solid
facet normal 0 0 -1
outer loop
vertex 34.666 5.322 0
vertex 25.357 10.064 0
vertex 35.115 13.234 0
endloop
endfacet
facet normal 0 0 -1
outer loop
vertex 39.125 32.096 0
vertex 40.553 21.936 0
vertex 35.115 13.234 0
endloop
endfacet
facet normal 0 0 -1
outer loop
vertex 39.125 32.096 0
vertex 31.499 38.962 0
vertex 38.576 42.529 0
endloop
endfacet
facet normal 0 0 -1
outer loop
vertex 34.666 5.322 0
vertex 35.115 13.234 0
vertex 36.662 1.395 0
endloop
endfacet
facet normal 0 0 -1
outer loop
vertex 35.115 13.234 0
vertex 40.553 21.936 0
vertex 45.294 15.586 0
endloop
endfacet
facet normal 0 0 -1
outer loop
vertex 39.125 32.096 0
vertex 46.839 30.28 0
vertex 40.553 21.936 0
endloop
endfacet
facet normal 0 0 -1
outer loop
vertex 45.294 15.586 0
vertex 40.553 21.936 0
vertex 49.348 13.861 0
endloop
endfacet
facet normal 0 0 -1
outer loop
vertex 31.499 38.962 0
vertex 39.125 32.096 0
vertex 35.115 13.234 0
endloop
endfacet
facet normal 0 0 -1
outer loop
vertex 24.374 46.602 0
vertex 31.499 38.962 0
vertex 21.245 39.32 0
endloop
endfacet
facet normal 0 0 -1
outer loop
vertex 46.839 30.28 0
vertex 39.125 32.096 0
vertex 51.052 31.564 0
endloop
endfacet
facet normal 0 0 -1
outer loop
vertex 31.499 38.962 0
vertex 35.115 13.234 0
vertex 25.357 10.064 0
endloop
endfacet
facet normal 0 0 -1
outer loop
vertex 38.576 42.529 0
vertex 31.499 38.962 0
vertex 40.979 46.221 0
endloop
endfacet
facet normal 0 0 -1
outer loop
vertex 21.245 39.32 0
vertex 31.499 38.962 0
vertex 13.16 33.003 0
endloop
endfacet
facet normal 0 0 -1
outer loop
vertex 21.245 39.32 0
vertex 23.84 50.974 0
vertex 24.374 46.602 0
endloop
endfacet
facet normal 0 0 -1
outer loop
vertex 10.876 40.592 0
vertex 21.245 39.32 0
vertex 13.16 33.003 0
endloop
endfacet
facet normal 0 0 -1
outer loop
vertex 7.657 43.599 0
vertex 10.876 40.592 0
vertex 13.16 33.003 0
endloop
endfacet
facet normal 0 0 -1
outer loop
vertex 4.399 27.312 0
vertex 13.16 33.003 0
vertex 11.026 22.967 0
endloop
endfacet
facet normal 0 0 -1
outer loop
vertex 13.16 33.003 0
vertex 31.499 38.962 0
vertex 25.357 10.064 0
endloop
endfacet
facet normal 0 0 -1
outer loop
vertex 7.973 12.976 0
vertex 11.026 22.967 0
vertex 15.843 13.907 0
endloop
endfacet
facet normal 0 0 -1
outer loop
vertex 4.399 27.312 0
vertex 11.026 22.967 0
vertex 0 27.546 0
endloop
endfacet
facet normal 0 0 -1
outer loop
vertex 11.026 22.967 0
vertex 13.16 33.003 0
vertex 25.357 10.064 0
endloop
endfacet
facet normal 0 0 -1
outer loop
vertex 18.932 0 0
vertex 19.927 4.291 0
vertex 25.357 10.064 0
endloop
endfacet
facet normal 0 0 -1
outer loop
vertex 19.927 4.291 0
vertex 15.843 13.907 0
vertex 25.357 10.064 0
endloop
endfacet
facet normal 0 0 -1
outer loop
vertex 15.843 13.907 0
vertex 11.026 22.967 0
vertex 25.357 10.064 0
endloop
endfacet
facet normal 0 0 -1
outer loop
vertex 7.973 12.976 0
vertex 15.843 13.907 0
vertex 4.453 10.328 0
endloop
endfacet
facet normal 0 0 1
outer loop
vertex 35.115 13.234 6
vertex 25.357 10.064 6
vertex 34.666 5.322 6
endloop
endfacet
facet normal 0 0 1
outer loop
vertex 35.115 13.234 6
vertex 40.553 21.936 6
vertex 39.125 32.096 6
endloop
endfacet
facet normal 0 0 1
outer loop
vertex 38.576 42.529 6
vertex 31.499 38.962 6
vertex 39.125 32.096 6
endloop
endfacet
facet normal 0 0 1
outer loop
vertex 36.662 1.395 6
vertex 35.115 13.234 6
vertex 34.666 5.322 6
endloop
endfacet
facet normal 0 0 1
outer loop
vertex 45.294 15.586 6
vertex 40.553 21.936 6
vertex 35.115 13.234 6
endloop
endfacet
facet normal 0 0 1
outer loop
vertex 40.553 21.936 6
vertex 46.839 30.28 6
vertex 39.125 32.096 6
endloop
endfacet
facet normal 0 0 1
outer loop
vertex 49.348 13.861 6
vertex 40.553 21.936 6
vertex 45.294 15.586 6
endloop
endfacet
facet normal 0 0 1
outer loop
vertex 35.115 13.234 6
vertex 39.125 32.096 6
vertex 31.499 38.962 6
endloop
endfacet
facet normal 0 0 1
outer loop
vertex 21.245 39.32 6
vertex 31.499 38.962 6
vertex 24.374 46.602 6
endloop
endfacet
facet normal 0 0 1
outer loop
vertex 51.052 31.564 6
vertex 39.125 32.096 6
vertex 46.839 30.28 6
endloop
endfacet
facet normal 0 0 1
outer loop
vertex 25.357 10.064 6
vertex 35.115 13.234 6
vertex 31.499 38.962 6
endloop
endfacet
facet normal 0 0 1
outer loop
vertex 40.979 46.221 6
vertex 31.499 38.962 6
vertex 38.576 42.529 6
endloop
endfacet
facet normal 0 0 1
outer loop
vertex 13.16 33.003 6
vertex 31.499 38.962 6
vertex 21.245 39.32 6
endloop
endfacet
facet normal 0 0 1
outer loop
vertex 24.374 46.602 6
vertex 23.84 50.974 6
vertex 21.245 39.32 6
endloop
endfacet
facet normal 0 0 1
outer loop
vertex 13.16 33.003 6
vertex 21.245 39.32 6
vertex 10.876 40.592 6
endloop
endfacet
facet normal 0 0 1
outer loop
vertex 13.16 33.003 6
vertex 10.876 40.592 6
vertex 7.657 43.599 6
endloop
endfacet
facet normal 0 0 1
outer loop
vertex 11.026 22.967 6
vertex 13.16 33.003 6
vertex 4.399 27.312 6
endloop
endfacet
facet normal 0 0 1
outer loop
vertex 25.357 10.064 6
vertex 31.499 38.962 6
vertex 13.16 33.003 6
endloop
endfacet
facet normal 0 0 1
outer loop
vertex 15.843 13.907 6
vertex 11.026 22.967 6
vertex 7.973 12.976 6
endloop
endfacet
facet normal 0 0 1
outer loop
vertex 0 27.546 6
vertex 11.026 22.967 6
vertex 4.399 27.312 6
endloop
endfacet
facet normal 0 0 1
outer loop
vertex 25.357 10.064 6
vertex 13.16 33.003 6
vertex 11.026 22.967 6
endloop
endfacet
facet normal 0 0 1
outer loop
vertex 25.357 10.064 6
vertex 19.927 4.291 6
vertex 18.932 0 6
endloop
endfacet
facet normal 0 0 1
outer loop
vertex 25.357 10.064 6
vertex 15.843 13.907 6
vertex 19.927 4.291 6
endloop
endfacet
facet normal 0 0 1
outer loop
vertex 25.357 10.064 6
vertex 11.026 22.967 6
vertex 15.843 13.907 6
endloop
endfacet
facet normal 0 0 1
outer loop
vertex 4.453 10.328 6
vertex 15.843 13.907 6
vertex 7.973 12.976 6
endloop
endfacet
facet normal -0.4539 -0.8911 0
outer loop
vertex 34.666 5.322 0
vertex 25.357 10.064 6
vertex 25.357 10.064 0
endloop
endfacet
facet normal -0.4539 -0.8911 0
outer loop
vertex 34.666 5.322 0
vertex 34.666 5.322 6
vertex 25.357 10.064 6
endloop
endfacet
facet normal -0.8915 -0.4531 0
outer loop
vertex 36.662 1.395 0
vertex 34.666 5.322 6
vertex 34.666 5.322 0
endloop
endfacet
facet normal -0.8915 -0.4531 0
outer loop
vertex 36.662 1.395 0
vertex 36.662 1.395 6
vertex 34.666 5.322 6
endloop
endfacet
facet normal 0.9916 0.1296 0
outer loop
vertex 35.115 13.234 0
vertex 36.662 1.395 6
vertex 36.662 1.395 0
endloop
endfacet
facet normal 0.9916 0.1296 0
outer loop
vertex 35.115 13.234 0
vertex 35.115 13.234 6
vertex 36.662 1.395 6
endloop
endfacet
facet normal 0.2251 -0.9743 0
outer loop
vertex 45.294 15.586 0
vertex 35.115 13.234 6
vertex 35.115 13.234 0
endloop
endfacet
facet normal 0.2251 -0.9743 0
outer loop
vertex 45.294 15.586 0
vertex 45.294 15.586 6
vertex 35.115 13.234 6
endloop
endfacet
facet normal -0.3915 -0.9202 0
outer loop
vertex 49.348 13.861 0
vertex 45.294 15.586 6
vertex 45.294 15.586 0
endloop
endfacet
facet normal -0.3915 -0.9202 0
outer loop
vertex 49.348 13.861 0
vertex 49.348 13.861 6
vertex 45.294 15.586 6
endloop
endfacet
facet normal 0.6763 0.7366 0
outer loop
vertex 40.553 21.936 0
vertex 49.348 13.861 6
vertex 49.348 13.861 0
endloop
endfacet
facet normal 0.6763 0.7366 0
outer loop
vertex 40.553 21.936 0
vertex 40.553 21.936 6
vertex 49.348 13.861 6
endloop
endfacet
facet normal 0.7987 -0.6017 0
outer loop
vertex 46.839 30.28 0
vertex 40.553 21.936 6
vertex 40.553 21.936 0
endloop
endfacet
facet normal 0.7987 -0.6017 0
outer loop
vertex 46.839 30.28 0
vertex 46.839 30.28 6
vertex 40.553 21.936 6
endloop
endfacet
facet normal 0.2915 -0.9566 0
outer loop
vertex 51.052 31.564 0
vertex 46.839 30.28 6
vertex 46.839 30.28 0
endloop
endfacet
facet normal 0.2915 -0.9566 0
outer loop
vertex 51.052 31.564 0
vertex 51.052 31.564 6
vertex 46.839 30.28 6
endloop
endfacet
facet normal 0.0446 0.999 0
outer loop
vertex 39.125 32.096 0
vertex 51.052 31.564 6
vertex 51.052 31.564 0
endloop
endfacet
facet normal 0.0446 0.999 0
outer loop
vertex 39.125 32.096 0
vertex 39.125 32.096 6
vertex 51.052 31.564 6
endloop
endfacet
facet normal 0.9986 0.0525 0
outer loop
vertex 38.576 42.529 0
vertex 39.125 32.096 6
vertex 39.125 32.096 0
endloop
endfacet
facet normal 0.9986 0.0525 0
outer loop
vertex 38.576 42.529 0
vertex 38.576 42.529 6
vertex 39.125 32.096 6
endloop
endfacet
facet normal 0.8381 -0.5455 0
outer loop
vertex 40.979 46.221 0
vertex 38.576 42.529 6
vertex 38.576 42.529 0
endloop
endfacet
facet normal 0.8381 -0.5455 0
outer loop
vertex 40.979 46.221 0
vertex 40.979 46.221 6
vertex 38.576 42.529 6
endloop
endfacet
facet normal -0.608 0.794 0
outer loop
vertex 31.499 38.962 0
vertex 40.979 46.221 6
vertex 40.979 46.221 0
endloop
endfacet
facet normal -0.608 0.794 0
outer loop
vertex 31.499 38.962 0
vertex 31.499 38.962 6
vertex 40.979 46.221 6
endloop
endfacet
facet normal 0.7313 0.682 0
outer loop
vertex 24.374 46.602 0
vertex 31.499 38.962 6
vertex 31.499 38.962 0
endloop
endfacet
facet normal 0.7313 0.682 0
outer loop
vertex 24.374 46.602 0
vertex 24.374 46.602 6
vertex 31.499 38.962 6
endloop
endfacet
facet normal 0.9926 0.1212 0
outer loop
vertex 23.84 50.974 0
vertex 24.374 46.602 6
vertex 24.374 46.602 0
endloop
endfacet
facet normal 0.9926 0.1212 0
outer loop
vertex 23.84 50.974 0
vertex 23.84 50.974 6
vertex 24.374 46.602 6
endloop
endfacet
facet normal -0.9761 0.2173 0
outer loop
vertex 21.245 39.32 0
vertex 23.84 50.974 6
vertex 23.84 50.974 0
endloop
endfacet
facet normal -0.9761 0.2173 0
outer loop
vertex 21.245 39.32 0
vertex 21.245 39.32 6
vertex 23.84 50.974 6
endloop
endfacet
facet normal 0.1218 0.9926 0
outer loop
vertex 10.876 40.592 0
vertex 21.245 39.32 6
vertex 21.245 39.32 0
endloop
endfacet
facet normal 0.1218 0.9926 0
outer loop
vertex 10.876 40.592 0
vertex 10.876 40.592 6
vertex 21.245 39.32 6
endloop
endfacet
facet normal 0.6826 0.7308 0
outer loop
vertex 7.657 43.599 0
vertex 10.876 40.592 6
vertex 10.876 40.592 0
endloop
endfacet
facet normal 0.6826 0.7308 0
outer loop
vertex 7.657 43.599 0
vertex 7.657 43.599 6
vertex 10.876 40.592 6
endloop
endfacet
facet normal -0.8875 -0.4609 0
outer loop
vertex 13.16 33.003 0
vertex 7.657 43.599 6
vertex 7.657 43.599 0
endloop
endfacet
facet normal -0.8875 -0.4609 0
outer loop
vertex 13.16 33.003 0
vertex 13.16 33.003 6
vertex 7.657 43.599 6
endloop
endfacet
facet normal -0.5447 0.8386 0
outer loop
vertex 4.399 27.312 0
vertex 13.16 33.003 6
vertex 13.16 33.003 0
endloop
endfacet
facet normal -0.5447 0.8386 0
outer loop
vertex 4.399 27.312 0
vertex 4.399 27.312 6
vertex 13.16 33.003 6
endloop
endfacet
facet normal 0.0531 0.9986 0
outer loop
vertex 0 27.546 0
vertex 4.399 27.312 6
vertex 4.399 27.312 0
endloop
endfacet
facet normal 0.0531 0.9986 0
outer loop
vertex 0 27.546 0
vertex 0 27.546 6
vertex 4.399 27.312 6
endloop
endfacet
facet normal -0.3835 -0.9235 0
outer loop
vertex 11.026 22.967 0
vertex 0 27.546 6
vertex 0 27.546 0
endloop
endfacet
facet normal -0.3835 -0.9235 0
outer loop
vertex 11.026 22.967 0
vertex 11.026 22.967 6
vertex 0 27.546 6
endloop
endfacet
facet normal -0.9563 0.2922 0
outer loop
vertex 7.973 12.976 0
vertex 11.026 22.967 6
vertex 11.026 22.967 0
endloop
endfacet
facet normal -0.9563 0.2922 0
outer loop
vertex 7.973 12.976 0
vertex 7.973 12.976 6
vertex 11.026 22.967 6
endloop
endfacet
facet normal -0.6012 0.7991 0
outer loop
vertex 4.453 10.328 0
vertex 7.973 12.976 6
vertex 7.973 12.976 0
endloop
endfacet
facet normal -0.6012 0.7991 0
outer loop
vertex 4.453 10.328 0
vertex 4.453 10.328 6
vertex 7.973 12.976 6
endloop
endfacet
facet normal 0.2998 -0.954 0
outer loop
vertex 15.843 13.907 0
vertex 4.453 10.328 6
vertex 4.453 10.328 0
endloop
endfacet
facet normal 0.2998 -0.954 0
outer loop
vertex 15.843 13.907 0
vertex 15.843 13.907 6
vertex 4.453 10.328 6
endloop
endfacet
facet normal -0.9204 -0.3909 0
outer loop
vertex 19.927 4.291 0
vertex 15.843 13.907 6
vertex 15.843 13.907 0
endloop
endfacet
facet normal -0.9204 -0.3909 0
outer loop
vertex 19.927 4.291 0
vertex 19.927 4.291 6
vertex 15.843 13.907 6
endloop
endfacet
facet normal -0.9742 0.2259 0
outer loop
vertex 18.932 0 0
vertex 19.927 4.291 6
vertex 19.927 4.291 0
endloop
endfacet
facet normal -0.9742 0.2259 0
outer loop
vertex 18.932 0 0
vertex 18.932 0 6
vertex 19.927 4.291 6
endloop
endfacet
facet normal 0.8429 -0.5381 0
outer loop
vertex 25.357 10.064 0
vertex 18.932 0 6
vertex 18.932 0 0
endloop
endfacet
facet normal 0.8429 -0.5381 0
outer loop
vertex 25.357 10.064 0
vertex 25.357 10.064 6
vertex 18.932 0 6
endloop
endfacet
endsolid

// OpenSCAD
$fn = 32;

// ----------------------------------------------------------------------
// Fan rotor section: 9 blades, 15 mm hub radius, 11 mm blades
// ----------------------------------------------------------------------

// --- parameters (mm) ---
profile_height = 6;       // extrusion height
profile_points = 27;      // points of the closed outline

profile = [[40.553, 21.936], [46.839, 30.28], [51.052, 31.564], [39.125, 32.096], [38.576, 42.529], [40.979, 46.221], [31.499, 38.962], [24.374, 46.602], [23.84, 50.974], [21.245, 39.32], [10.876, 40.592], [7.657, 43.599], [13.16, 33.003], [4.399, 27.312], [0, 27.546], [11.026, 22.967], [7.973, 12.976], [4.453, 10.328], [15.843, 13.907], [19.927, 4.291], [18.932, 0], [25.357, 10.064], [34.666, 5.322], [36.662, 1.395], [35.115, 13.234], [45.294, 15.586], [49.348, 13.861]];  // single closed polygon, 27 points, counter clockwise

// --- the one profile operation ---
linear_extrude(height = profile_height) polygon(points = profile);
